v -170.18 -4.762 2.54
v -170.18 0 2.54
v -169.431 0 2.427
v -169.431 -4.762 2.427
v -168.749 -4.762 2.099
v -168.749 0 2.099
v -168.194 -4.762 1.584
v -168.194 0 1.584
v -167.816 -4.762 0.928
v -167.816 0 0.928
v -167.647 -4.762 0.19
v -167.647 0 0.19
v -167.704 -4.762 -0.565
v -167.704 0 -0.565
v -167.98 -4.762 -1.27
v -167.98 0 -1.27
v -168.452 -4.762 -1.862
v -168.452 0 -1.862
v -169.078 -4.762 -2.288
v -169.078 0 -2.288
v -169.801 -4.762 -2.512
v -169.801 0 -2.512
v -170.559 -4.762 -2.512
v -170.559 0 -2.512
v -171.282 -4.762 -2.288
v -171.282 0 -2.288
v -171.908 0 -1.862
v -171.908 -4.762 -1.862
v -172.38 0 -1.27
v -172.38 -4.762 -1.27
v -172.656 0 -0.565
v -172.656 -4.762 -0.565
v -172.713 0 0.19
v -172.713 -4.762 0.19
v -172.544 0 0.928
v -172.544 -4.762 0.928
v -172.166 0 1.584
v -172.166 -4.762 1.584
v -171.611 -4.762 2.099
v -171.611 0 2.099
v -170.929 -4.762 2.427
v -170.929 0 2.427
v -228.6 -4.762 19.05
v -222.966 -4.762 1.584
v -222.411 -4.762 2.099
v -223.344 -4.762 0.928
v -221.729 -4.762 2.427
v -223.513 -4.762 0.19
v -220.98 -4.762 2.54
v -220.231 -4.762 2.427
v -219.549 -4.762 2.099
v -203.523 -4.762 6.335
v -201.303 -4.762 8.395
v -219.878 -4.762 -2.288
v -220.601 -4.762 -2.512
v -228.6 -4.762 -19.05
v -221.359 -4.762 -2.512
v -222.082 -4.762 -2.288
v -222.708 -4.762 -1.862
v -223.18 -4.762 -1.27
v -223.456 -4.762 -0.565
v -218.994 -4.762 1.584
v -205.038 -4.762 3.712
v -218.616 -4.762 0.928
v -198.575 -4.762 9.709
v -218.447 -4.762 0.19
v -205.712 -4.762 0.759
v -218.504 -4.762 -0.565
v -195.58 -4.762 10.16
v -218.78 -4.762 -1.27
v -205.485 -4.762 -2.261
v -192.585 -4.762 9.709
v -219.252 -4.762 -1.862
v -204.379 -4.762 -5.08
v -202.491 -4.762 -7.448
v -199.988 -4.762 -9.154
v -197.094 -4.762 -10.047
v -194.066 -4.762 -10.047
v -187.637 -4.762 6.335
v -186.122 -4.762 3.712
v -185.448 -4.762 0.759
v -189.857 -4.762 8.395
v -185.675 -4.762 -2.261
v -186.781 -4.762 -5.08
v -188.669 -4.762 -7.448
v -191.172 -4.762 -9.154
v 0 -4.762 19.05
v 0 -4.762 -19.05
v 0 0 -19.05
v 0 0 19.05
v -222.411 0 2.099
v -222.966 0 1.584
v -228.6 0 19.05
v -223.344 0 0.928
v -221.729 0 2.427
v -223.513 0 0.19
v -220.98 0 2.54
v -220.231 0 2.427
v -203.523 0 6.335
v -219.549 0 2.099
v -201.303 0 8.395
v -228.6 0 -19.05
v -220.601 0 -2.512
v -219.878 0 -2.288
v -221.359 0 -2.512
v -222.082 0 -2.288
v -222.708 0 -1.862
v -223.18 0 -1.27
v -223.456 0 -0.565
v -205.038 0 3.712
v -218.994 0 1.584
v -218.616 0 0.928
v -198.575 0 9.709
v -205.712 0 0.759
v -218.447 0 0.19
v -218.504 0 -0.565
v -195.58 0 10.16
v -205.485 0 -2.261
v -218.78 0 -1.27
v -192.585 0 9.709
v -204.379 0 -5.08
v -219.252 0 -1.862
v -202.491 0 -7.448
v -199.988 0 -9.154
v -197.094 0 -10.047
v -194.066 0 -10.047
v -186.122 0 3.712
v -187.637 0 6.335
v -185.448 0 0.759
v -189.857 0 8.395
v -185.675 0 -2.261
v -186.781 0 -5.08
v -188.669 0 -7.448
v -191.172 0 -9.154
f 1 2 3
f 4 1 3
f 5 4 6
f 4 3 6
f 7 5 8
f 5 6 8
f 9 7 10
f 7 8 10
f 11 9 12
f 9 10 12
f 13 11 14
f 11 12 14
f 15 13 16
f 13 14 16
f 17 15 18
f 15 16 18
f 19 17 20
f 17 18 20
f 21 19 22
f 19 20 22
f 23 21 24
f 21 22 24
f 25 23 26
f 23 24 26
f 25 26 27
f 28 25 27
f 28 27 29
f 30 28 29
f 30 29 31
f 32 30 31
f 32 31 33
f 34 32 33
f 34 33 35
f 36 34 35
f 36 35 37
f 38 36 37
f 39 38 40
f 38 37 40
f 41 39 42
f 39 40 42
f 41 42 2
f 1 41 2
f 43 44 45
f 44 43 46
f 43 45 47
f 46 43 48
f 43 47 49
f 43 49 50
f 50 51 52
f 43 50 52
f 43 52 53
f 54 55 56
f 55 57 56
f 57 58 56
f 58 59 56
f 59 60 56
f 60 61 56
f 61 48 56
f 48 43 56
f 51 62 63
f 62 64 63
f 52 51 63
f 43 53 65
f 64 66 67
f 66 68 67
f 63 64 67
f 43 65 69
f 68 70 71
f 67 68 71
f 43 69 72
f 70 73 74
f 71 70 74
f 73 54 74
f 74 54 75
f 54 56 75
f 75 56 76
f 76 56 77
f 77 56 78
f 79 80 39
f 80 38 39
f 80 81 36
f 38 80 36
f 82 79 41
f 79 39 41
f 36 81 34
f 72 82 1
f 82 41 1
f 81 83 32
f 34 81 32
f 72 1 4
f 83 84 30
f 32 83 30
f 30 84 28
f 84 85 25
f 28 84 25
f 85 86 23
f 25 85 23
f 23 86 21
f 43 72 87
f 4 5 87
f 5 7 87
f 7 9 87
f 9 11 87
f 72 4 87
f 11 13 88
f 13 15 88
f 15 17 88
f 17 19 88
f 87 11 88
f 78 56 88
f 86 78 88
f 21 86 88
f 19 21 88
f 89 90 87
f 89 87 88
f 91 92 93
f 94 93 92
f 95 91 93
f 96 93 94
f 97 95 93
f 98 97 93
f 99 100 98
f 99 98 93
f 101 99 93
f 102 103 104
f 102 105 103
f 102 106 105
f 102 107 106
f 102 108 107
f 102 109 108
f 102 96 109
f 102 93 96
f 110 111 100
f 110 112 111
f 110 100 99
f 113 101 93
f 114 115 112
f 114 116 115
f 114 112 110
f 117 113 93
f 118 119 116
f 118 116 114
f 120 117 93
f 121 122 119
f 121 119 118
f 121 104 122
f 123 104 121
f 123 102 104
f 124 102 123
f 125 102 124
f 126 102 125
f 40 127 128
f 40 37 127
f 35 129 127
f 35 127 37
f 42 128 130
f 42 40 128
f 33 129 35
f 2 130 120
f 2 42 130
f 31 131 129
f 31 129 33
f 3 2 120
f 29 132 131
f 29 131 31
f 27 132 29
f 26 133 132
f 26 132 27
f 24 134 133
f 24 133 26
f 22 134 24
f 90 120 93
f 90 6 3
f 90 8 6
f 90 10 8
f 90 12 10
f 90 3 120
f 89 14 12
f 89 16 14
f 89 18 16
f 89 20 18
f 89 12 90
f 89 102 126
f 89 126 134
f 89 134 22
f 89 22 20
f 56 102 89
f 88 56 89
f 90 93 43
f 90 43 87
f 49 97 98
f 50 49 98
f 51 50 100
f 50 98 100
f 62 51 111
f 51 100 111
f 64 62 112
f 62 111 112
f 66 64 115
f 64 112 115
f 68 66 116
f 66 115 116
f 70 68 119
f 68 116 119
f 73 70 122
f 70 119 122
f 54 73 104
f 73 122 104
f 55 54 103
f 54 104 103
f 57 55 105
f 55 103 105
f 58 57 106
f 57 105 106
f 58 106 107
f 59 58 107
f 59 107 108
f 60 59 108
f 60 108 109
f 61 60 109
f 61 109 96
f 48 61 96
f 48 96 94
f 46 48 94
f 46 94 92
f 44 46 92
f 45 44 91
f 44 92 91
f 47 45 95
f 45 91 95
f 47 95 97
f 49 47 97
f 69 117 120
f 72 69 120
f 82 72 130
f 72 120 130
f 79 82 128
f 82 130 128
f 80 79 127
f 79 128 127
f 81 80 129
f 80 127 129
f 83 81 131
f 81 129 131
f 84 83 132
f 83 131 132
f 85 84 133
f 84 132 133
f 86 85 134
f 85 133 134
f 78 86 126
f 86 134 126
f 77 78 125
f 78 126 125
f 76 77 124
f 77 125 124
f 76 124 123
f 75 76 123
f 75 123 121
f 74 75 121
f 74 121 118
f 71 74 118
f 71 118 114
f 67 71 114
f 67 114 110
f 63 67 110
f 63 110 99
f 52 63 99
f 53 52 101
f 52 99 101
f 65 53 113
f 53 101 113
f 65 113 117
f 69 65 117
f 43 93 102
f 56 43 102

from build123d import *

# Parameters (mm, degrees)
SKETCH3_W          = 228.6
SKETCH3_H          = 38.1
SKETCH3_R          = 2.54
SKETCH3_R_2        = 10.16
BASE_FLANGE1_DEPTH = 4.7625


# Sheet-metal steps are written as plain solids
with BuildPart() as part:
    # Sketch3 → Base-Flange1 (new body)
    with BuildSketch(Plane(origin=(0, 0, 0), x_dir=(1, 0, 0), z_dir=(0, 1, 0))):
        with Locations((-114.3, 0)):
            Rectangle(SKETCH3_W, SKETCH3_H)
        with Locations(Location((-220.98, 0, 0), (0, 0, 270))):
            Circle(SKETCH3_R, mode=Mode.SUBTRACT)
        with Locations(Location((-195.58, 0, 0), (0, 0, 270))):
            Circle(SKETCH3_R_2, mode=Mode.SUBTRACT)
        with Locations(Location((-170.18, 0, 0), (0, 0, 270))):
            Circle(SKETCH3_R, mode=Mode.SUBTRACT)
    extrude(amount=-BASE_FLANGE1_DEPTH)


solid = part.part
